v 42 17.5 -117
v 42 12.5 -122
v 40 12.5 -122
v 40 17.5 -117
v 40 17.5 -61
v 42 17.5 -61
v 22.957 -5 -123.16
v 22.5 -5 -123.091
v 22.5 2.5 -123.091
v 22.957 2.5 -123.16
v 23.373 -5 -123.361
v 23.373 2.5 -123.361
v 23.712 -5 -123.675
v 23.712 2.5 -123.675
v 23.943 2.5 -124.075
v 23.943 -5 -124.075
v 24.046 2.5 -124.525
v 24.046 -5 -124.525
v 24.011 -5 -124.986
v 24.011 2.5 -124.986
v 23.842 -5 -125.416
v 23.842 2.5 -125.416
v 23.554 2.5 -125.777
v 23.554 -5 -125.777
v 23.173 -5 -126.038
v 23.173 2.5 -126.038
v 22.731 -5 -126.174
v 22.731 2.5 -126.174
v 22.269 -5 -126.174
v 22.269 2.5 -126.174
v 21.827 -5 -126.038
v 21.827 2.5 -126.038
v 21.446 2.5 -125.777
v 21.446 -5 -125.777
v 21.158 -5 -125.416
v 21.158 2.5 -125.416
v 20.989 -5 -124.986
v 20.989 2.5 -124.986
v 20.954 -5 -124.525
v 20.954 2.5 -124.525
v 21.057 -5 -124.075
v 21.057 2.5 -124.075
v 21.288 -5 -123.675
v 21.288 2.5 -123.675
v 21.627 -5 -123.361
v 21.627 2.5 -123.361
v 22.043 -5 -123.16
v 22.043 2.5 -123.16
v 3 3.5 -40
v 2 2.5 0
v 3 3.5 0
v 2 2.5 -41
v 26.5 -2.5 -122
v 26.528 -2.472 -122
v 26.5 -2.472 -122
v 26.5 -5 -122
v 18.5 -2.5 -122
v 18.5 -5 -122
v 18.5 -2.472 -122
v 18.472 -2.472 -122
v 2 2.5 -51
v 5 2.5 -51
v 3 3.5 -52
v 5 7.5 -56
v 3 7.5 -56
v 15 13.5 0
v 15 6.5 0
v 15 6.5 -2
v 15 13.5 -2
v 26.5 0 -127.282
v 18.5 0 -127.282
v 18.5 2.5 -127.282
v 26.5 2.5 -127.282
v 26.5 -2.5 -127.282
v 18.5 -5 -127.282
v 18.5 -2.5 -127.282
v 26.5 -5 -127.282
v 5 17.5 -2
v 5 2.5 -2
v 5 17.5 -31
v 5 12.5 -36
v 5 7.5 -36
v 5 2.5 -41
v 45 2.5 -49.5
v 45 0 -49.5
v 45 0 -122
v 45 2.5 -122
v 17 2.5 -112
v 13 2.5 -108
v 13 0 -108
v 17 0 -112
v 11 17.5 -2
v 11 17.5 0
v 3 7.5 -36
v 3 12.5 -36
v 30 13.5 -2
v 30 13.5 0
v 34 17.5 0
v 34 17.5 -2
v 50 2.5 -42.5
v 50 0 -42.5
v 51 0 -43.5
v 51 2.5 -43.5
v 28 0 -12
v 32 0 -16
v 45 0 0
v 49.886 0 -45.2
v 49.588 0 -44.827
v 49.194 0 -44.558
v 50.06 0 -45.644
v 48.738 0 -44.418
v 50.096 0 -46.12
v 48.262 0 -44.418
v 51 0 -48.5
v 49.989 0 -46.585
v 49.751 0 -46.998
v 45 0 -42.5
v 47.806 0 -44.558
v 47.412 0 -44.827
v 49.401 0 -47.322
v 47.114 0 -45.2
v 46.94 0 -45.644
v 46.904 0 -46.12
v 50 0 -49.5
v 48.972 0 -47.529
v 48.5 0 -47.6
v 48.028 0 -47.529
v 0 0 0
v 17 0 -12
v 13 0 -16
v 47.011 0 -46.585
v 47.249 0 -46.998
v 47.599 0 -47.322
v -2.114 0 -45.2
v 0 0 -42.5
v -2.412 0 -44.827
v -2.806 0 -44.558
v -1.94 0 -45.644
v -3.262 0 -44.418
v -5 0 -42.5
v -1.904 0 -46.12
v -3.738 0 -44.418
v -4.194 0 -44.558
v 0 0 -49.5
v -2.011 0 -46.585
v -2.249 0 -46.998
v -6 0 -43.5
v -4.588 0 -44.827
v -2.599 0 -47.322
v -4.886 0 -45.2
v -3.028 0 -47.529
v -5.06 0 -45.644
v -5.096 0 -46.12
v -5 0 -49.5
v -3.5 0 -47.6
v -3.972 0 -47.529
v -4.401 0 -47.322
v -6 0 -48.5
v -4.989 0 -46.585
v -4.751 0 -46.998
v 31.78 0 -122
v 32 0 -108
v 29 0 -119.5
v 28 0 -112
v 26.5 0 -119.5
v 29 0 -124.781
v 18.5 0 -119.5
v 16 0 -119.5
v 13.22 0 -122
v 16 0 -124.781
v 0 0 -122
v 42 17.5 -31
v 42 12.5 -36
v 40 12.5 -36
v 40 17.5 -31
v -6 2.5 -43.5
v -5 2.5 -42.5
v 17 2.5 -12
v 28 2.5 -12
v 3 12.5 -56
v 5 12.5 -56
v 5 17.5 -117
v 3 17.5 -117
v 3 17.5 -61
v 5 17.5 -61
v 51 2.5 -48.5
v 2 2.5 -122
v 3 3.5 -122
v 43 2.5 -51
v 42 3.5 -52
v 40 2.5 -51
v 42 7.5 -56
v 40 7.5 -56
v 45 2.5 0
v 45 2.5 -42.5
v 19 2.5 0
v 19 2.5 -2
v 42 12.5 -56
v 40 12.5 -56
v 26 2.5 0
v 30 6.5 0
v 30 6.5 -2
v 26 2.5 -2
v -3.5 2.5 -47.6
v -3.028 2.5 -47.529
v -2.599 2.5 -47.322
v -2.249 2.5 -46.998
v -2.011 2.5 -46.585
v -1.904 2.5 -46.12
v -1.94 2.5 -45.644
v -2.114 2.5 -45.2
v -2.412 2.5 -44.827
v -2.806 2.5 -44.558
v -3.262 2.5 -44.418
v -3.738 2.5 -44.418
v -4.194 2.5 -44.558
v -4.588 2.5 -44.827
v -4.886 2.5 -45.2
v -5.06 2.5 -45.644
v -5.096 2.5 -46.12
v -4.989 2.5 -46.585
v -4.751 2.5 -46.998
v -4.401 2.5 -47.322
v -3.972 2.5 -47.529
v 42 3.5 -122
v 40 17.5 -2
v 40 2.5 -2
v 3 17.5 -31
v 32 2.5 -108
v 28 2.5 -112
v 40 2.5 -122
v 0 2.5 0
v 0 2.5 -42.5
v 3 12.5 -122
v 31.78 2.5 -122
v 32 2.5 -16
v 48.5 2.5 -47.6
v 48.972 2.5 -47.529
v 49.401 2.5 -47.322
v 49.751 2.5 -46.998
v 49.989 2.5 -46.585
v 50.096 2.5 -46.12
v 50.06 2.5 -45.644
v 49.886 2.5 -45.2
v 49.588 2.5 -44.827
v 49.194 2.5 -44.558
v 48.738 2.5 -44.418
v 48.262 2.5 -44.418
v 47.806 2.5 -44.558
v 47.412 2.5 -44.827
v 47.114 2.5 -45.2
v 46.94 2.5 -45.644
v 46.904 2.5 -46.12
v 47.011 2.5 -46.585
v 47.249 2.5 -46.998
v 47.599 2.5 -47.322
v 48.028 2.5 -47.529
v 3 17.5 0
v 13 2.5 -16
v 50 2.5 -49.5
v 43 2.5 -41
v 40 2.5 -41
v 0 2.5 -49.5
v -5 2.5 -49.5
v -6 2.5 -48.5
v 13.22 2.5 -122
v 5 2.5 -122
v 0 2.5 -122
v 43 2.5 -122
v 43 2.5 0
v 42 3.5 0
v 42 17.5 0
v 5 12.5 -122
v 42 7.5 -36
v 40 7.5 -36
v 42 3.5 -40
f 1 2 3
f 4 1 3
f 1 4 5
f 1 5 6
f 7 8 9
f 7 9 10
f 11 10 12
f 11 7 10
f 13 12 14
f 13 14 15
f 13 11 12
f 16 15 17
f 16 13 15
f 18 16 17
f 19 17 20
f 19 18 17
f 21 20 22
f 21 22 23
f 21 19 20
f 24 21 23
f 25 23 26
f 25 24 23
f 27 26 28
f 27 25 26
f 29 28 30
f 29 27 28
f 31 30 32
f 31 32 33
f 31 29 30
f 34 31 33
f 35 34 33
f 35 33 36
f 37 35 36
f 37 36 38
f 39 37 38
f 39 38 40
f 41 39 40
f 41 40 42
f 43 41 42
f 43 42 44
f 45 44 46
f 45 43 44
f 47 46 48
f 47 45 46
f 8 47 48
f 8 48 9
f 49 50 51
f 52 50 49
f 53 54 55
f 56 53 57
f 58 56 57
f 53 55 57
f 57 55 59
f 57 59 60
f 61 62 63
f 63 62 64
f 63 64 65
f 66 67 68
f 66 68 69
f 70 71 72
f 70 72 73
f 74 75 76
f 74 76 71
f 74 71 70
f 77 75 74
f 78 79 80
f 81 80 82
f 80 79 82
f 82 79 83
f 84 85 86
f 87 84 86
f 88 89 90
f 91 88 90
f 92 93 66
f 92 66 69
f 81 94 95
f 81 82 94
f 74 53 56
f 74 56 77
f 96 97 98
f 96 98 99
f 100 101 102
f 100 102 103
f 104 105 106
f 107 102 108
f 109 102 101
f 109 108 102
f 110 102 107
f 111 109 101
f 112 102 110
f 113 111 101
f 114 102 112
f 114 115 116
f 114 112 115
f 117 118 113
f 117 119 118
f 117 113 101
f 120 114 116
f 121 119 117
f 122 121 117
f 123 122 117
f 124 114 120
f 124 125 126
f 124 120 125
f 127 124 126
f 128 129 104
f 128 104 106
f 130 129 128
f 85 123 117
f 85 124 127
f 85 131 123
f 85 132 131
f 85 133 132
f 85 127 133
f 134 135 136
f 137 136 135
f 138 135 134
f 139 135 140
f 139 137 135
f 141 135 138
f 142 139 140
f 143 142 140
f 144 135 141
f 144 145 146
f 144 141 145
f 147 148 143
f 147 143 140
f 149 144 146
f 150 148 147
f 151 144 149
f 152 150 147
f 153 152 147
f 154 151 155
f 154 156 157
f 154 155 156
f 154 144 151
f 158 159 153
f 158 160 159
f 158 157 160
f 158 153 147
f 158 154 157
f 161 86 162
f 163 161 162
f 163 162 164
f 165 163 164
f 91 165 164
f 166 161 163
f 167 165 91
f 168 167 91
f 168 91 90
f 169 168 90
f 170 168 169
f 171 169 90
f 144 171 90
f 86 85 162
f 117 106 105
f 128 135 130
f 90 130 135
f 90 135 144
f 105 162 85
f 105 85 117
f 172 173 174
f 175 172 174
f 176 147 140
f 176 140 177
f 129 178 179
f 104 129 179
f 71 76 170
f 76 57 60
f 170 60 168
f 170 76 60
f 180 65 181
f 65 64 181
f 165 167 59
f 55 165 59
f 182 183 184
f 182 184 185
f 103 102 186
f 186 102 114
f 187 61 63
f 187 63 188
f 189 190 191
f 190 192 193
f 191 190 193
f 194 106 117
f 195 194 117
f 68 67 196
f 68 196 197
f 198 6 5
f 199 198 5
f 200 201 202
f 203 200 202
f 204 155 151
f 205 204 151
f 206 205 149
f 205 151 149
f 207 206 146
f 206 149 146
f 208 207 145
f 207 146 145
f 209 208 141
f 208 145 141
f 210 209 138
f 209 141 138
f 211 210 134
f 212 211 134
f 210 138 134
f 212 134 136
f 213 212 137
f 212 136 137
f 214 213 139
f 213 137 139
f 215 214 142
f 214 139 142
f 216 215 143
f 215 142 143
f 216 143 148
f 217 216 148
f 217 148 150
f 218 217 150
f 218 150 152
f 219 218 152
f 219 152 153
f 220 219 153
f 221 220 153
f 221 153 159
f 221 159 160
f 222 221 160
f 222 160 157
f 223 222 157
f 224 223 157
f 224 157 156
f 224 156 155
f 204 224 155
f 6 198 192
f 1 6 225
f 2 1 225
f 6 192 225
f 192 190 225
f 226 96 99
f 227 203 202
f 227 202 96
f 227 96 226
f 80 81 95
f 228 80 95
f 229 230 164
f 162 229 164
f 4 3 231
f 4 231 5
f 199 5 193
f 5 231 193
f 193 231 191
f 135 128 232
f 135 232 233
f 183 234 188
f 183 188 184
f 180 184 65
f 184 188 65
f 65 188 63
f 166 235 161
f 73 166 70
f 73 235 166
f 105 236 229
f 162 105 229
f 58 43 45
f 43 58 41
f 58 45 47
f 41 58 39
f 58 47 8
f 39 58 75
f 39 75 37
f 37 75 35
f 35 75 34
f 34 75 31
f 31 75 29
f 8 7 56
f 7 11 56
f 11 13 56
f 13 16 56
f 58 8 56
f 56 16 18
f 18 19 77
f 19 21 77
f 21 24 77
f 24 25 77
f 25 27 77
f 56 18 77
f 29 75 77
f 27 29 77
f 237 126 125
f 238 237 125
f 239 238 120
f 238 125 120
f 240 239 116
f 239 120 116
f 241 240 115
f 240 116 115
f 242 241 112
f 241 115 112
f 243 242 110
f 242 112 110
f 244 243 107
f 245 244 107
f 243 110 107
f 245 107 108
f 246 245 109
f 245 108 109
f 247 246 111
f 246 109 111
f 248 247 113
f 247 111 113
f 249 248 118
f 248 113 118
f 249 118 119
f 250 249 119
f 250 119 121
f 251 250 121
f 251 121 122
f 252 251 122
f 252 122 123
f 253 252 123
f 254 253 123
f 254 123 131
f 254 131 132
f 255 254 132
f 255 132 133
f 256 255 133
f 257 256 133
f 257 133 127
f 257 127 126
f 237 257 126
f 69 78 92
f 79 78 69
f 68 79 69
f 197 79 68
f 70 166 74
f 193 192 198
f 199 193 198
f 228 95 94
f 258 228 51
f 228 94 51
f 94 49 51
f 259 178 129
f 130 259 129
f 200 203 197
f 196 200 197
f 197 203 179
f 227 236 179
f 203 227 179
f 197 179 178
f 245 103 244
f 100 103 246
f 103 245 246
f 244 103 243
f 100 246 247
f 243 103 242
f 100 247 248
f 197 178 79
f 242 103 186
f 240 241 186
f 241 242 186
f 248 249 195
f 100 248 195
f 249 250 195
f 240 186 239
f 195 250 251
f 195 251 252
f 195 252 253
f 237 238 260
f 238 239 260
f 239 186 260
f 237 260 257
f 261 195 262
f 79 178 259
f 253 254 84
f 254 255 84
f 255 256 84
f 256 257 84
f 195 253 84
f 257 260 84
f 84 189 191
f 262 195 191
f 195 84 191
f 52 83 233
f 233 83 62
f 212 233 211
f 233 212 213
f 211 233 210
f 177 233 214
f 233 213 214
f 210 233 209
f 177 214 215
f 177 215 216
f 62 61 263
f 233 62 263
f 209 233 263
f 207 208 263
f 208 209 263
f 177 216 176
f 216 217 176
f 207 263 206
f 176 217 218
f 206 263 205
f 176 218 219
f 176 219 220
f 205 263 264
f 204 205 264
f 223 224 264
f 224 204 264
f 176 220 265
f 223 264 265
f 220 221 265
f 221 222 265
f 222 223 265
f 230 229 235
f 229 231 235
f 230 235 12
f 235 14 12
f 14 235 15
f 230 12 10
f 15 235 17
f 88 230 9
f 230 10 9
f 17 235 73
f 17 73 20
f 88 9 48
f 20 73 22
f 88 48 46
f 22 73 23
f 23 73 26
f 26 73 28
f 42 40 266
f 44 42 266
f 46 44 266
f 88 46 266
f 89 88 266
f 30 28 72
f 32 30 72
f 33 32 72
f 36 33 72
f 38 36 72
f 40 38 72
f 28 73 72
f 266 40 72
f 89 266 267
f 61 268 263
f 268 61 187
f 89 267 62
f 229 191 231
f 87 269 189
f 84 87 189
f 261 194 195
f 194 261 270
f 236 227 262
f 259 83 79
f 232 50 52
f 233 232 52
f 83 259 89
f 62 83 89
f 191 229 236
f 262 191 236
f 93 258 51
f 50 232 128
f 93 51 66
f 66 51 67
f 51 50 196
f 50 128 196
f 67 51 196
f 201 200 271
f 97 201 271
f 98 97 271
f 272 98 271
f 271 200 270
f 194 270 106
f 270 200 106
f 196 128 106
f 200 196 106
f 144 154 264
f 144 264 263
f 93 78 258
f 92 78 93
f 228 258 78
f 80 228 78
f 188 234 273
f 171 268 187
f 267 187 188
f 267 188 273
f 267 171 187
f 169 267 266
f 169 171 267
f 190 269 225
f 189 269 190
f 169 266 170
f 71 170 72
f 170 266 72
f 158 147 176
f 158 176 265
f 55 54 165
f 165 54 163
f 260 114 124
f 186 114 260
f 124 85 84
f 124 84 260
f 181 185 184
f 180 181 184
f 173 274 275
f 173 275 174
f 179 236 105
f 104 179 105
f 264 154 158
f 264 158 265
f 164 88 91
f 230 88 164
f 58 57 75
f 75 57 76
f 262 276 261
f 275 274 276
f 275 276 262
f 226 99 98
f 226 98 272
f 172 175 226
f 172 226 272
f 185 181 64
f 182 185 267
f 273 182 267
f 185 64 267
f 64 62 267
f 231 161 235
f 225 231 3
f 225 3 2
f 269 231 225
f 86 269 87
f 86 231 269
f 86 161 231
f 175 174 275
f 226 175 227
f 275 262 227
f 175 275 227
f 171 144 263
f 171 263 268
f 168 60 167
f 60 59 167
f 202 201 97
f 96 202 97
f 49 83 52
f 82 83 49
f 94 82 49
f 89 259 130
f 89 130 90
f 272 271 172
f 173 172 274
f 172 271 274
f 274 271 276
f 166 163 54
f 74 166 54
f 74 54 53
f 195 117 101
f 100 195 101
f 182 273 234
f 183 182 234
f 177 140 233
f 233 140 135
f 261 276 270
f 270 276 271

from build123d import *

# Parameters (mm, degrees)
SKETCH1_W                = 45
SKETCH1_H                = 122
BOSS_EXTRUDE1_DEPTH      = 2.5
SKETCH3_W                = 35
SKETCH3_H                = 2
BOSS_EXTRUDE2_DEPTH      = 15
SKETCH4_W                = 12
SKETCH4_H                = 7
BOSS_EXTRUDE3_DEPTH      = 2.5
SKETCH6_W                = 19
SKETCH6_H                = 100
CUT_EXTRUDE2_DEPTH       = 12.5
FILLET1_SIZE             = 4
SKETCH8_W                = 20
SKETCH8_H                = 15
CUT_EXTRUDE3_DEPTH       = 58.5
FILLET2_SIZE             = 5
SKETCH9_R                = 1.6
CUT_EXTRUDE4_DEPTH       = 58.5
BOSS_EXTRUDE4_DEPTH      = 2.5
BOSS_EXTRUDE4_DEPTH_BACK = 5
SKETCH10_W               = 8
SKETCH10_H               = 5.282493572
SKETCH10_R               = 1.55
BOSS_EXTRUDE5_DEPTH      = 8
BOSS_EXTRUDE6_DEPTH      = 2.5
FILLET3_SIZE             = 2.5
SKETCH13_W               = 15
SKETCH13_H               = 30
CUT_EXTRUDE5_DEPTH       = 6.5
FILLET4_SIZE             = 4
FILLET5_SIZE             = 1
FILLET7_SIZE             = 1


with BuildPart() as part:
    # Sketch1 → Boss-Extrude1 (new body)
    with BuildSketch(Plane(origin=(0, 0, 0), x_dir=(1, 0, 0), z_dir=(0, 1, 0))):
        with Locations((22.5, 61)):
            Rectangle(SKETCH1_W, SKETCH1_H)
    extrude(amount=BOSS_EXTRUDE1_DEPTH)

    # Sketch3 → Boss-Extrude2 (add)
    with BuildSketch(Plane(origin=(0, 2.5, 0), x_dir=(1, 0, 0), z_dir=(0, 1, 0))):
        Polygon((5, 122), (3, 122), (3, 0), (5, 0), (5, 2), align=None)
        with Locations((22.5, 1)):
            Rectangle(SKETCH3_W, SKETCH3_H)
        Polygon((40, 122), (40, 2), (40, 0), (42, 0), (42, 122), align=None)
    extrude(amount=BOSS_EXTRUDE2_DEPTH)

    # Sketch4 → Boss-Extrude3 (add)
    with BuildSketch(Plane(origin=(0, 0, 0), x_dir=(1, 0, 0), z_dir=(0, 1, 0))):
        with Locations((0, 46)):
            Rectangle(SKETCH4_W, SKETCH4_H)
        with Locations((45, 46)):
            Rectangle(SKETCH4_W, SKETCH4_H)
    extrude(amount=BOSS_EXTRUDE3_DEPTH)

    # Sketch6 → Cut-Extrude2 (cut)
    with BuildSketch(Plane(origin=(0, 2.5, 0), x_dir=(1, 0, 0), z_dir=(0, 1, 0))):
        with Locations((22.5, 62)):
            Rectangle(SKETCH6_W, SKETCH6_H)
    extrude(amount=-CUT_EXTRUDE2_DEPTH, mode=Mode.SUBTRACT)

    # Fillet1
    fillet1_edges = [part.edges().sort_by_distance(p)[0] for p in [
        (32, 1.25, -112),
        (32, 1.25, -12),
        (13, 1.25, -12),
        (13, 1.25, -112),
    ]]
    chamfer(fillet1_edges, length=FILLET1_SIZE)

    # Sketch8 → Cut-Extrude3 (cut)
    with BuildSketch(Plane(origin=(51, 0, 0), x_dir=(0, 0, -1), z_dir=(1, 0, 0))):
        with Locations((46, 10)):
            Rectangle(SKETCH8_W, SKETCH8_H)
    extrude(amount=-CUT_EXTRUDE3_DEPTH, mode=Mode.SUBTRACT)

    # Fillet2
    fillet2_edges = [part.edges().sort_by_distance(p)[0] for p in [
        (4, 17.5, -56),
        (41, 17.5, -56),
        (4, 2.5, -36),
        (41, 2.5, -36),
        (4, 17.5, -36),
        (41, 17.5, -36),
        (4, 2.5, -56),
        (41, 2.5, -56),
        (4, 17.5, -122),
        (41, 17.5, -122),
    ]]
    chamfer(fillet2_edges, length=FILLET2_SIZE)

    # Sketch9 → Cut-Extrude4 (cut)
    with BuildSketch(Plane.XZ):
        with Locations(Location((48.5, -46, 0), (0, 0, 270))):
            Circle(SKETCH9_R)
        with Locations(Location((-3.5, -46, 0), (0, 0, 270))):
            Circle(SKETCH9_R)
    extrude(amount=-CUT_EXTRUDE4_DEPTH, mode=Mode.SUBTRACT)



with BuildPart() as body_2:
    # Sketch10 → Boss-Extrude4 (new, two sides: drawn at the far end of the back side and taken through both)
    with BuildSketch(Plane(origin=(0, 0, 0), x_dir=(1, 0, 0), z_dir=(0, 1, 0)).offset(-BOSS_EXTRUDE4_DEPTH_BACK)):
        with Locations((22.5, 124.641246786)):
            Rectangle(SKETCH10_W, SKETCH10_H)
        with Locations(Location((22.5, 124.641246786, 0), (0, 0, 270))):
            Circle(SKETCH10_R, mode=Mode.SUBTRACT)
    extrude(amount=BOSS_EXTRUDE4_DEPTH + BOSS_EXTRUDE4_DEPTH_BACK)


with BuildPart() as part_1:
    add(part.part)

    add(body_2.part)  # Boss-Extrude5 merges body 2
    # Sketch11 → Boss-Extrude5 (add)
    with BuildSketch(Plane.ZY.offset(-18.5)):
        Polygon((-119.5, 0), (-122.028446462, -2.5), (-122, 0), align=None)
    extrude(amount=-BOSS_EXTRUDE5_DEPTH)

    # Sketch12 → Boss-Extrude6 (add)
    with BuildSketch(Plane(origin=(0, 2.5, 0), x_dir=(1, 0, 0), z_dir=(0, 1, 0))):
        Polygon((18.5, 127.282493572), (18.5, 122), (13.22, 122), align=None)
        Polygon((26.5, 122), (31.78, 122), (26.5, 127.282493572), align=None)
    extrude(amount=-BOSS_EXTRUDE6_DEPTH)

    # Fillet3
    # the kernel refuses this chamfer: 2.5 mm, written as the material it adds along each edge
    with BuildSketch(Plane(origin=(26.5, 0, -113.07079253), x_dir=(0.9996219169112968, 0.027495876610586372, 0), z_dir=(0, 0, -1))) as fillet3_piece_1_section:
        Polygon((FILLET3_SIZE * 0.999621916911, FILLET3_SIZE * 0.0274958766106), (-FILLET3_SIZE * 0.0274958766106, FILLET3_SIZE * 0.999621916911), (0, 0), align=None)
    fillet3_piece_1 = extrude(amount=14.211701041, mode=Mode.PRIVATE)
    fillet3_piece_1 = split(fillet3_piece_1, bisect_by=Plane(origin=(26.425464868, -2.516462273, -122.045096052), z_dir=(0, -0.7110955817269744, 0.7030953517470985)), keep=Keep.TOP, mode=Mode.PRIVATE)
    fillet3_piece_1 = split(fillet3_piece_1, bisect_by=Plane(origin=(26.425464868, -2.531550229, -122), z_dir=(0, 0, -1)), keep=Keep.TOP, mode=Mode.PRIVATE)
    add(fillet3_piece_1)
    with BuildSketch(Plane(origin=(26.5, 0, -113.07079253), x_dir=(0.9996219169112968, 0.027495876610586372, 0), z_dir=(0, 0, -1))) as fillet3_piece_2_section:
        Polygon((FILLET3_SIZE * 0.999621916911, FILLET3_SIZE * 0.0274958766106), (-FILLET3_SIZE * 0.0274958766106, FILLET3_SIZE * 0.999621916911), (0, 0), align=None)
    fillet3_piece_2 = extrude(amount=14.211701041, mode=Mode.PRIVATE)
    fillet3_piece_2 = split(fillet3_piece_2, bisect_by=Plane(origin=(27.453210407, -1.061082343, -120.573155958), z_dir=(0, 0.7110955817269744, -0.7030953517470985)), keep=Keep.TOP, mode=Mode.PRIVATE)
    fillet3_piece_2 = split(fillet3_piece_2, bisect_by=Plane(origin=(27.453210407, -0.58369775, -122), z_dir=(0, 0, 1)), keep=Keep.TOP, mode=Mode.PRIVATE)
    add(fillet3_piece_2)
    with BuildSketch(Plane(origin=(26.5, 0, -113.07079253), x_dir=(0.9996219169112968, 0.027495876610586372, 0), z_dir=(0, 0, -1))) as fillet3_piece_3_section:
        Polygon((FILLET3_SIZE * 0.999621916911, FILLET3_SIZE * 0.0274958766106), (-FILLET3_SIZE * 0.0274958766106, FILLET3_SIZE * 0.999621916911), (0, 0), align=None)
    fillet3_piece_3 = extrude(amount=14.211701041, mode=Mode.PRIVATE)
    fillet3_piece_3 = split(fillet3_piece_3, bisect_by=Plane(origin=(27.235712014, -2.816950005, -122.349002909), z_dir=(0, 0.7110955817269744, -0.7030953517470985)), keep=Keep.TOP, mode=Mode.PRIVATE)
    fillet3_piece_3 = split(fillet3_piece_3, bisect_by=Plane(origin=(28.372764332, -0.871738969, -125.408844794), z_dir=(-0.7072736937748051, 0, 0.7069398291892623)), keep=Keep.TOP, mode=Mode.PRIVATE)
    fillet3_piece_3 = split(fillet3_piece_3, bisect_by=Plane(origin=(27.235712014, -0.871738969, -122), z_dir=(0, 0, -1)), keep=Keep.TOP, mode=Mode.PRIVATE)
    add(fillet3_piece_3)
    with BuildSketch(Plane(origin=(18.5, 0, -127.282493572), x_dir=(0.027495876610586317, -0.9996219169112968, 0), z_dir=(0, 0, 1))) as fillet3_piece_4_section:
        Polygon((FILLET3_SIZE * 0.999621916911, -FILLET3_SIZE * 0.0274958766106), (-FILLET3_SIZE * 0.0274958766106, -FILLET3_SIZE * 0.999621916911), (0, 0), align=None)
    fillet3_piece_4 = extrude(amount=14.211701041, mode=Mode.PRIVATE)
    fillet3_piece_4 = split(fillet3_piece_4, bisect_by=Plane(origin=(17.764287986, -2.816950005, -122.349002909), z_dir=(0, 0.7110955817269744, -0.7030953517470985)), keep=Keep.TOP, mode=Mode.PRIVATE)
    fillet3_piece_4 = split(fillet3_piece_4, bisect_by=Plane(origin=(17.764287986, -0.871738969, -122), z_dir=(0, 0, -1)), keep=Keep.TOP, mode=Mode.PRIVATE)
    fillet3_piece_4 = split(fillet3_piece_4, bisect_by=Plane(origin=(16.627235668, -0.871738969, -125.408844794), z_dir=(0.7072736937748045, 0, 0.7069398291892628)), keep=Keep.TOP, mode=Mode.PRIVATE)
    add(fillet3_piece_4)
    with BuildSketch(Plane(origin=(18.5, 0, -127.282493572), x_dir=(0.027495876610586317, -0.9996219169112968, 0), z_dir=(0, 0, 1))) as fillet3_piece_5_section:
        Polygon((FILLET3_SIZE * 0.999621916911, -FILLET3_SIZE * 0.0274958766106), (-FILLET3_SIZE * 0.0274958766106, -FILLET3_SIZE * 0.999621916911), (0, 0), align=None)
    fillet3_piece_5 = extrude(amount=14.211701041, mode=Mode.PRIVATE)
    fillet3_piece_5 = split(fillet3_piece_5, bisect_by=Plane(origin=(17.546789593, -1.061082343, -120.573155958), z_dir=(0, 0.7110955817269744, -0.7030953517470985)), keep=Keep.TOP, mode=Mode.PRIVATE)
    fillet3_piece_5 = split(fillet3_piece_5, bisect_by=Plane(origin=(17.546789593, -0.58369775, -122), z_dir=(0, 0, 1)), keep=Keep.TOP, mode=Mode.PRIVATE)
    add(fillet3_piece_5)
    with BuildSketch(Plane(origin=(18.5, 0, -127.282493572), x_dir=(0.027495876610586317, -0.9996219169112968, 0), z_dir=(0, 0, 1))) as fillet3_piece_6_section:
        Polygon((FILLET3_SIZE * 0.999621916911, -FILLET3_SIZE * 0.0274958766106), (-FILLET3_SIZE * 0.0274958766106, -FILLET3_SIZE * 0.999621916911), (0, 0), align=None)
    fillet3_piece_6 = extrude(amount=14.211701041, mode=Mode.PRIVATE)
    fillet3_piece_6 = split(fillet3_piece_6, bisect_by=Plane(origin=(18.574535132, -2.516462273, -122.045096052), z_dir=(0, -0.7110955817269744, 0.7030953517470985)), keep=Keep.TOP, mode=Mode.PRIVATE)
    fillet3_piece_6 = split(fillet3_piece_6, bisect_by=Plane(origin=(18.574535132, -2.531550229, -122), z_dir=(0, 0, -1)), keep=Keep.TOP, mode=Mode.PRIVATE)
    add(fillet3_piece_6)

    # Sketch13 → Cut-Extrude5 (cut)
    with BuildSketch(Plane.XY):
        with Locations((22.5, 17.5)):
            Rectangle(SKETCH13_W, SKETCH13_H)
    extrude(amount=-CUT_EXTRUDE5_DEPTH, mode=Mode.SUBTRACT)

    # Fillet4
    fillet4_edges = [part_1.edges().sort_by_distance(p)[0] for p in [
        (30, 17.5, -1),
        (15, 17.5, -1),
        (30, 2.5, -1),
        (15, 2.5, -1),
    ]]
    chamfer(fillet4_edges, length=FILLET4_SIZE)

    # Fillet5
    fillet5_edges = [part_1.edges().sort_by_distance(p)[0] for p in [
        (42, 2.5, -20.5),
        (3, 2.5, -20.5),
        (3, 2.5, -86.5),
        (42, 2.5, -86.5),
    ]]
    chamfer(fillet5_edges, length=FILLET5_SIZE)

    # Fillet7
    fillet7_edges = [part_1.edges().sort_by_distance(p)[0] for p in [
        (-6, 1.25, -42.5),
        (-6, 1.25, -49.5),
        (51, 1.25, -49.5),
        (51, 1.25, -42.5),
    ]]
    chamfer(fillet7_edges, length=FILLET7_SIZE)


solid = part_1.part
